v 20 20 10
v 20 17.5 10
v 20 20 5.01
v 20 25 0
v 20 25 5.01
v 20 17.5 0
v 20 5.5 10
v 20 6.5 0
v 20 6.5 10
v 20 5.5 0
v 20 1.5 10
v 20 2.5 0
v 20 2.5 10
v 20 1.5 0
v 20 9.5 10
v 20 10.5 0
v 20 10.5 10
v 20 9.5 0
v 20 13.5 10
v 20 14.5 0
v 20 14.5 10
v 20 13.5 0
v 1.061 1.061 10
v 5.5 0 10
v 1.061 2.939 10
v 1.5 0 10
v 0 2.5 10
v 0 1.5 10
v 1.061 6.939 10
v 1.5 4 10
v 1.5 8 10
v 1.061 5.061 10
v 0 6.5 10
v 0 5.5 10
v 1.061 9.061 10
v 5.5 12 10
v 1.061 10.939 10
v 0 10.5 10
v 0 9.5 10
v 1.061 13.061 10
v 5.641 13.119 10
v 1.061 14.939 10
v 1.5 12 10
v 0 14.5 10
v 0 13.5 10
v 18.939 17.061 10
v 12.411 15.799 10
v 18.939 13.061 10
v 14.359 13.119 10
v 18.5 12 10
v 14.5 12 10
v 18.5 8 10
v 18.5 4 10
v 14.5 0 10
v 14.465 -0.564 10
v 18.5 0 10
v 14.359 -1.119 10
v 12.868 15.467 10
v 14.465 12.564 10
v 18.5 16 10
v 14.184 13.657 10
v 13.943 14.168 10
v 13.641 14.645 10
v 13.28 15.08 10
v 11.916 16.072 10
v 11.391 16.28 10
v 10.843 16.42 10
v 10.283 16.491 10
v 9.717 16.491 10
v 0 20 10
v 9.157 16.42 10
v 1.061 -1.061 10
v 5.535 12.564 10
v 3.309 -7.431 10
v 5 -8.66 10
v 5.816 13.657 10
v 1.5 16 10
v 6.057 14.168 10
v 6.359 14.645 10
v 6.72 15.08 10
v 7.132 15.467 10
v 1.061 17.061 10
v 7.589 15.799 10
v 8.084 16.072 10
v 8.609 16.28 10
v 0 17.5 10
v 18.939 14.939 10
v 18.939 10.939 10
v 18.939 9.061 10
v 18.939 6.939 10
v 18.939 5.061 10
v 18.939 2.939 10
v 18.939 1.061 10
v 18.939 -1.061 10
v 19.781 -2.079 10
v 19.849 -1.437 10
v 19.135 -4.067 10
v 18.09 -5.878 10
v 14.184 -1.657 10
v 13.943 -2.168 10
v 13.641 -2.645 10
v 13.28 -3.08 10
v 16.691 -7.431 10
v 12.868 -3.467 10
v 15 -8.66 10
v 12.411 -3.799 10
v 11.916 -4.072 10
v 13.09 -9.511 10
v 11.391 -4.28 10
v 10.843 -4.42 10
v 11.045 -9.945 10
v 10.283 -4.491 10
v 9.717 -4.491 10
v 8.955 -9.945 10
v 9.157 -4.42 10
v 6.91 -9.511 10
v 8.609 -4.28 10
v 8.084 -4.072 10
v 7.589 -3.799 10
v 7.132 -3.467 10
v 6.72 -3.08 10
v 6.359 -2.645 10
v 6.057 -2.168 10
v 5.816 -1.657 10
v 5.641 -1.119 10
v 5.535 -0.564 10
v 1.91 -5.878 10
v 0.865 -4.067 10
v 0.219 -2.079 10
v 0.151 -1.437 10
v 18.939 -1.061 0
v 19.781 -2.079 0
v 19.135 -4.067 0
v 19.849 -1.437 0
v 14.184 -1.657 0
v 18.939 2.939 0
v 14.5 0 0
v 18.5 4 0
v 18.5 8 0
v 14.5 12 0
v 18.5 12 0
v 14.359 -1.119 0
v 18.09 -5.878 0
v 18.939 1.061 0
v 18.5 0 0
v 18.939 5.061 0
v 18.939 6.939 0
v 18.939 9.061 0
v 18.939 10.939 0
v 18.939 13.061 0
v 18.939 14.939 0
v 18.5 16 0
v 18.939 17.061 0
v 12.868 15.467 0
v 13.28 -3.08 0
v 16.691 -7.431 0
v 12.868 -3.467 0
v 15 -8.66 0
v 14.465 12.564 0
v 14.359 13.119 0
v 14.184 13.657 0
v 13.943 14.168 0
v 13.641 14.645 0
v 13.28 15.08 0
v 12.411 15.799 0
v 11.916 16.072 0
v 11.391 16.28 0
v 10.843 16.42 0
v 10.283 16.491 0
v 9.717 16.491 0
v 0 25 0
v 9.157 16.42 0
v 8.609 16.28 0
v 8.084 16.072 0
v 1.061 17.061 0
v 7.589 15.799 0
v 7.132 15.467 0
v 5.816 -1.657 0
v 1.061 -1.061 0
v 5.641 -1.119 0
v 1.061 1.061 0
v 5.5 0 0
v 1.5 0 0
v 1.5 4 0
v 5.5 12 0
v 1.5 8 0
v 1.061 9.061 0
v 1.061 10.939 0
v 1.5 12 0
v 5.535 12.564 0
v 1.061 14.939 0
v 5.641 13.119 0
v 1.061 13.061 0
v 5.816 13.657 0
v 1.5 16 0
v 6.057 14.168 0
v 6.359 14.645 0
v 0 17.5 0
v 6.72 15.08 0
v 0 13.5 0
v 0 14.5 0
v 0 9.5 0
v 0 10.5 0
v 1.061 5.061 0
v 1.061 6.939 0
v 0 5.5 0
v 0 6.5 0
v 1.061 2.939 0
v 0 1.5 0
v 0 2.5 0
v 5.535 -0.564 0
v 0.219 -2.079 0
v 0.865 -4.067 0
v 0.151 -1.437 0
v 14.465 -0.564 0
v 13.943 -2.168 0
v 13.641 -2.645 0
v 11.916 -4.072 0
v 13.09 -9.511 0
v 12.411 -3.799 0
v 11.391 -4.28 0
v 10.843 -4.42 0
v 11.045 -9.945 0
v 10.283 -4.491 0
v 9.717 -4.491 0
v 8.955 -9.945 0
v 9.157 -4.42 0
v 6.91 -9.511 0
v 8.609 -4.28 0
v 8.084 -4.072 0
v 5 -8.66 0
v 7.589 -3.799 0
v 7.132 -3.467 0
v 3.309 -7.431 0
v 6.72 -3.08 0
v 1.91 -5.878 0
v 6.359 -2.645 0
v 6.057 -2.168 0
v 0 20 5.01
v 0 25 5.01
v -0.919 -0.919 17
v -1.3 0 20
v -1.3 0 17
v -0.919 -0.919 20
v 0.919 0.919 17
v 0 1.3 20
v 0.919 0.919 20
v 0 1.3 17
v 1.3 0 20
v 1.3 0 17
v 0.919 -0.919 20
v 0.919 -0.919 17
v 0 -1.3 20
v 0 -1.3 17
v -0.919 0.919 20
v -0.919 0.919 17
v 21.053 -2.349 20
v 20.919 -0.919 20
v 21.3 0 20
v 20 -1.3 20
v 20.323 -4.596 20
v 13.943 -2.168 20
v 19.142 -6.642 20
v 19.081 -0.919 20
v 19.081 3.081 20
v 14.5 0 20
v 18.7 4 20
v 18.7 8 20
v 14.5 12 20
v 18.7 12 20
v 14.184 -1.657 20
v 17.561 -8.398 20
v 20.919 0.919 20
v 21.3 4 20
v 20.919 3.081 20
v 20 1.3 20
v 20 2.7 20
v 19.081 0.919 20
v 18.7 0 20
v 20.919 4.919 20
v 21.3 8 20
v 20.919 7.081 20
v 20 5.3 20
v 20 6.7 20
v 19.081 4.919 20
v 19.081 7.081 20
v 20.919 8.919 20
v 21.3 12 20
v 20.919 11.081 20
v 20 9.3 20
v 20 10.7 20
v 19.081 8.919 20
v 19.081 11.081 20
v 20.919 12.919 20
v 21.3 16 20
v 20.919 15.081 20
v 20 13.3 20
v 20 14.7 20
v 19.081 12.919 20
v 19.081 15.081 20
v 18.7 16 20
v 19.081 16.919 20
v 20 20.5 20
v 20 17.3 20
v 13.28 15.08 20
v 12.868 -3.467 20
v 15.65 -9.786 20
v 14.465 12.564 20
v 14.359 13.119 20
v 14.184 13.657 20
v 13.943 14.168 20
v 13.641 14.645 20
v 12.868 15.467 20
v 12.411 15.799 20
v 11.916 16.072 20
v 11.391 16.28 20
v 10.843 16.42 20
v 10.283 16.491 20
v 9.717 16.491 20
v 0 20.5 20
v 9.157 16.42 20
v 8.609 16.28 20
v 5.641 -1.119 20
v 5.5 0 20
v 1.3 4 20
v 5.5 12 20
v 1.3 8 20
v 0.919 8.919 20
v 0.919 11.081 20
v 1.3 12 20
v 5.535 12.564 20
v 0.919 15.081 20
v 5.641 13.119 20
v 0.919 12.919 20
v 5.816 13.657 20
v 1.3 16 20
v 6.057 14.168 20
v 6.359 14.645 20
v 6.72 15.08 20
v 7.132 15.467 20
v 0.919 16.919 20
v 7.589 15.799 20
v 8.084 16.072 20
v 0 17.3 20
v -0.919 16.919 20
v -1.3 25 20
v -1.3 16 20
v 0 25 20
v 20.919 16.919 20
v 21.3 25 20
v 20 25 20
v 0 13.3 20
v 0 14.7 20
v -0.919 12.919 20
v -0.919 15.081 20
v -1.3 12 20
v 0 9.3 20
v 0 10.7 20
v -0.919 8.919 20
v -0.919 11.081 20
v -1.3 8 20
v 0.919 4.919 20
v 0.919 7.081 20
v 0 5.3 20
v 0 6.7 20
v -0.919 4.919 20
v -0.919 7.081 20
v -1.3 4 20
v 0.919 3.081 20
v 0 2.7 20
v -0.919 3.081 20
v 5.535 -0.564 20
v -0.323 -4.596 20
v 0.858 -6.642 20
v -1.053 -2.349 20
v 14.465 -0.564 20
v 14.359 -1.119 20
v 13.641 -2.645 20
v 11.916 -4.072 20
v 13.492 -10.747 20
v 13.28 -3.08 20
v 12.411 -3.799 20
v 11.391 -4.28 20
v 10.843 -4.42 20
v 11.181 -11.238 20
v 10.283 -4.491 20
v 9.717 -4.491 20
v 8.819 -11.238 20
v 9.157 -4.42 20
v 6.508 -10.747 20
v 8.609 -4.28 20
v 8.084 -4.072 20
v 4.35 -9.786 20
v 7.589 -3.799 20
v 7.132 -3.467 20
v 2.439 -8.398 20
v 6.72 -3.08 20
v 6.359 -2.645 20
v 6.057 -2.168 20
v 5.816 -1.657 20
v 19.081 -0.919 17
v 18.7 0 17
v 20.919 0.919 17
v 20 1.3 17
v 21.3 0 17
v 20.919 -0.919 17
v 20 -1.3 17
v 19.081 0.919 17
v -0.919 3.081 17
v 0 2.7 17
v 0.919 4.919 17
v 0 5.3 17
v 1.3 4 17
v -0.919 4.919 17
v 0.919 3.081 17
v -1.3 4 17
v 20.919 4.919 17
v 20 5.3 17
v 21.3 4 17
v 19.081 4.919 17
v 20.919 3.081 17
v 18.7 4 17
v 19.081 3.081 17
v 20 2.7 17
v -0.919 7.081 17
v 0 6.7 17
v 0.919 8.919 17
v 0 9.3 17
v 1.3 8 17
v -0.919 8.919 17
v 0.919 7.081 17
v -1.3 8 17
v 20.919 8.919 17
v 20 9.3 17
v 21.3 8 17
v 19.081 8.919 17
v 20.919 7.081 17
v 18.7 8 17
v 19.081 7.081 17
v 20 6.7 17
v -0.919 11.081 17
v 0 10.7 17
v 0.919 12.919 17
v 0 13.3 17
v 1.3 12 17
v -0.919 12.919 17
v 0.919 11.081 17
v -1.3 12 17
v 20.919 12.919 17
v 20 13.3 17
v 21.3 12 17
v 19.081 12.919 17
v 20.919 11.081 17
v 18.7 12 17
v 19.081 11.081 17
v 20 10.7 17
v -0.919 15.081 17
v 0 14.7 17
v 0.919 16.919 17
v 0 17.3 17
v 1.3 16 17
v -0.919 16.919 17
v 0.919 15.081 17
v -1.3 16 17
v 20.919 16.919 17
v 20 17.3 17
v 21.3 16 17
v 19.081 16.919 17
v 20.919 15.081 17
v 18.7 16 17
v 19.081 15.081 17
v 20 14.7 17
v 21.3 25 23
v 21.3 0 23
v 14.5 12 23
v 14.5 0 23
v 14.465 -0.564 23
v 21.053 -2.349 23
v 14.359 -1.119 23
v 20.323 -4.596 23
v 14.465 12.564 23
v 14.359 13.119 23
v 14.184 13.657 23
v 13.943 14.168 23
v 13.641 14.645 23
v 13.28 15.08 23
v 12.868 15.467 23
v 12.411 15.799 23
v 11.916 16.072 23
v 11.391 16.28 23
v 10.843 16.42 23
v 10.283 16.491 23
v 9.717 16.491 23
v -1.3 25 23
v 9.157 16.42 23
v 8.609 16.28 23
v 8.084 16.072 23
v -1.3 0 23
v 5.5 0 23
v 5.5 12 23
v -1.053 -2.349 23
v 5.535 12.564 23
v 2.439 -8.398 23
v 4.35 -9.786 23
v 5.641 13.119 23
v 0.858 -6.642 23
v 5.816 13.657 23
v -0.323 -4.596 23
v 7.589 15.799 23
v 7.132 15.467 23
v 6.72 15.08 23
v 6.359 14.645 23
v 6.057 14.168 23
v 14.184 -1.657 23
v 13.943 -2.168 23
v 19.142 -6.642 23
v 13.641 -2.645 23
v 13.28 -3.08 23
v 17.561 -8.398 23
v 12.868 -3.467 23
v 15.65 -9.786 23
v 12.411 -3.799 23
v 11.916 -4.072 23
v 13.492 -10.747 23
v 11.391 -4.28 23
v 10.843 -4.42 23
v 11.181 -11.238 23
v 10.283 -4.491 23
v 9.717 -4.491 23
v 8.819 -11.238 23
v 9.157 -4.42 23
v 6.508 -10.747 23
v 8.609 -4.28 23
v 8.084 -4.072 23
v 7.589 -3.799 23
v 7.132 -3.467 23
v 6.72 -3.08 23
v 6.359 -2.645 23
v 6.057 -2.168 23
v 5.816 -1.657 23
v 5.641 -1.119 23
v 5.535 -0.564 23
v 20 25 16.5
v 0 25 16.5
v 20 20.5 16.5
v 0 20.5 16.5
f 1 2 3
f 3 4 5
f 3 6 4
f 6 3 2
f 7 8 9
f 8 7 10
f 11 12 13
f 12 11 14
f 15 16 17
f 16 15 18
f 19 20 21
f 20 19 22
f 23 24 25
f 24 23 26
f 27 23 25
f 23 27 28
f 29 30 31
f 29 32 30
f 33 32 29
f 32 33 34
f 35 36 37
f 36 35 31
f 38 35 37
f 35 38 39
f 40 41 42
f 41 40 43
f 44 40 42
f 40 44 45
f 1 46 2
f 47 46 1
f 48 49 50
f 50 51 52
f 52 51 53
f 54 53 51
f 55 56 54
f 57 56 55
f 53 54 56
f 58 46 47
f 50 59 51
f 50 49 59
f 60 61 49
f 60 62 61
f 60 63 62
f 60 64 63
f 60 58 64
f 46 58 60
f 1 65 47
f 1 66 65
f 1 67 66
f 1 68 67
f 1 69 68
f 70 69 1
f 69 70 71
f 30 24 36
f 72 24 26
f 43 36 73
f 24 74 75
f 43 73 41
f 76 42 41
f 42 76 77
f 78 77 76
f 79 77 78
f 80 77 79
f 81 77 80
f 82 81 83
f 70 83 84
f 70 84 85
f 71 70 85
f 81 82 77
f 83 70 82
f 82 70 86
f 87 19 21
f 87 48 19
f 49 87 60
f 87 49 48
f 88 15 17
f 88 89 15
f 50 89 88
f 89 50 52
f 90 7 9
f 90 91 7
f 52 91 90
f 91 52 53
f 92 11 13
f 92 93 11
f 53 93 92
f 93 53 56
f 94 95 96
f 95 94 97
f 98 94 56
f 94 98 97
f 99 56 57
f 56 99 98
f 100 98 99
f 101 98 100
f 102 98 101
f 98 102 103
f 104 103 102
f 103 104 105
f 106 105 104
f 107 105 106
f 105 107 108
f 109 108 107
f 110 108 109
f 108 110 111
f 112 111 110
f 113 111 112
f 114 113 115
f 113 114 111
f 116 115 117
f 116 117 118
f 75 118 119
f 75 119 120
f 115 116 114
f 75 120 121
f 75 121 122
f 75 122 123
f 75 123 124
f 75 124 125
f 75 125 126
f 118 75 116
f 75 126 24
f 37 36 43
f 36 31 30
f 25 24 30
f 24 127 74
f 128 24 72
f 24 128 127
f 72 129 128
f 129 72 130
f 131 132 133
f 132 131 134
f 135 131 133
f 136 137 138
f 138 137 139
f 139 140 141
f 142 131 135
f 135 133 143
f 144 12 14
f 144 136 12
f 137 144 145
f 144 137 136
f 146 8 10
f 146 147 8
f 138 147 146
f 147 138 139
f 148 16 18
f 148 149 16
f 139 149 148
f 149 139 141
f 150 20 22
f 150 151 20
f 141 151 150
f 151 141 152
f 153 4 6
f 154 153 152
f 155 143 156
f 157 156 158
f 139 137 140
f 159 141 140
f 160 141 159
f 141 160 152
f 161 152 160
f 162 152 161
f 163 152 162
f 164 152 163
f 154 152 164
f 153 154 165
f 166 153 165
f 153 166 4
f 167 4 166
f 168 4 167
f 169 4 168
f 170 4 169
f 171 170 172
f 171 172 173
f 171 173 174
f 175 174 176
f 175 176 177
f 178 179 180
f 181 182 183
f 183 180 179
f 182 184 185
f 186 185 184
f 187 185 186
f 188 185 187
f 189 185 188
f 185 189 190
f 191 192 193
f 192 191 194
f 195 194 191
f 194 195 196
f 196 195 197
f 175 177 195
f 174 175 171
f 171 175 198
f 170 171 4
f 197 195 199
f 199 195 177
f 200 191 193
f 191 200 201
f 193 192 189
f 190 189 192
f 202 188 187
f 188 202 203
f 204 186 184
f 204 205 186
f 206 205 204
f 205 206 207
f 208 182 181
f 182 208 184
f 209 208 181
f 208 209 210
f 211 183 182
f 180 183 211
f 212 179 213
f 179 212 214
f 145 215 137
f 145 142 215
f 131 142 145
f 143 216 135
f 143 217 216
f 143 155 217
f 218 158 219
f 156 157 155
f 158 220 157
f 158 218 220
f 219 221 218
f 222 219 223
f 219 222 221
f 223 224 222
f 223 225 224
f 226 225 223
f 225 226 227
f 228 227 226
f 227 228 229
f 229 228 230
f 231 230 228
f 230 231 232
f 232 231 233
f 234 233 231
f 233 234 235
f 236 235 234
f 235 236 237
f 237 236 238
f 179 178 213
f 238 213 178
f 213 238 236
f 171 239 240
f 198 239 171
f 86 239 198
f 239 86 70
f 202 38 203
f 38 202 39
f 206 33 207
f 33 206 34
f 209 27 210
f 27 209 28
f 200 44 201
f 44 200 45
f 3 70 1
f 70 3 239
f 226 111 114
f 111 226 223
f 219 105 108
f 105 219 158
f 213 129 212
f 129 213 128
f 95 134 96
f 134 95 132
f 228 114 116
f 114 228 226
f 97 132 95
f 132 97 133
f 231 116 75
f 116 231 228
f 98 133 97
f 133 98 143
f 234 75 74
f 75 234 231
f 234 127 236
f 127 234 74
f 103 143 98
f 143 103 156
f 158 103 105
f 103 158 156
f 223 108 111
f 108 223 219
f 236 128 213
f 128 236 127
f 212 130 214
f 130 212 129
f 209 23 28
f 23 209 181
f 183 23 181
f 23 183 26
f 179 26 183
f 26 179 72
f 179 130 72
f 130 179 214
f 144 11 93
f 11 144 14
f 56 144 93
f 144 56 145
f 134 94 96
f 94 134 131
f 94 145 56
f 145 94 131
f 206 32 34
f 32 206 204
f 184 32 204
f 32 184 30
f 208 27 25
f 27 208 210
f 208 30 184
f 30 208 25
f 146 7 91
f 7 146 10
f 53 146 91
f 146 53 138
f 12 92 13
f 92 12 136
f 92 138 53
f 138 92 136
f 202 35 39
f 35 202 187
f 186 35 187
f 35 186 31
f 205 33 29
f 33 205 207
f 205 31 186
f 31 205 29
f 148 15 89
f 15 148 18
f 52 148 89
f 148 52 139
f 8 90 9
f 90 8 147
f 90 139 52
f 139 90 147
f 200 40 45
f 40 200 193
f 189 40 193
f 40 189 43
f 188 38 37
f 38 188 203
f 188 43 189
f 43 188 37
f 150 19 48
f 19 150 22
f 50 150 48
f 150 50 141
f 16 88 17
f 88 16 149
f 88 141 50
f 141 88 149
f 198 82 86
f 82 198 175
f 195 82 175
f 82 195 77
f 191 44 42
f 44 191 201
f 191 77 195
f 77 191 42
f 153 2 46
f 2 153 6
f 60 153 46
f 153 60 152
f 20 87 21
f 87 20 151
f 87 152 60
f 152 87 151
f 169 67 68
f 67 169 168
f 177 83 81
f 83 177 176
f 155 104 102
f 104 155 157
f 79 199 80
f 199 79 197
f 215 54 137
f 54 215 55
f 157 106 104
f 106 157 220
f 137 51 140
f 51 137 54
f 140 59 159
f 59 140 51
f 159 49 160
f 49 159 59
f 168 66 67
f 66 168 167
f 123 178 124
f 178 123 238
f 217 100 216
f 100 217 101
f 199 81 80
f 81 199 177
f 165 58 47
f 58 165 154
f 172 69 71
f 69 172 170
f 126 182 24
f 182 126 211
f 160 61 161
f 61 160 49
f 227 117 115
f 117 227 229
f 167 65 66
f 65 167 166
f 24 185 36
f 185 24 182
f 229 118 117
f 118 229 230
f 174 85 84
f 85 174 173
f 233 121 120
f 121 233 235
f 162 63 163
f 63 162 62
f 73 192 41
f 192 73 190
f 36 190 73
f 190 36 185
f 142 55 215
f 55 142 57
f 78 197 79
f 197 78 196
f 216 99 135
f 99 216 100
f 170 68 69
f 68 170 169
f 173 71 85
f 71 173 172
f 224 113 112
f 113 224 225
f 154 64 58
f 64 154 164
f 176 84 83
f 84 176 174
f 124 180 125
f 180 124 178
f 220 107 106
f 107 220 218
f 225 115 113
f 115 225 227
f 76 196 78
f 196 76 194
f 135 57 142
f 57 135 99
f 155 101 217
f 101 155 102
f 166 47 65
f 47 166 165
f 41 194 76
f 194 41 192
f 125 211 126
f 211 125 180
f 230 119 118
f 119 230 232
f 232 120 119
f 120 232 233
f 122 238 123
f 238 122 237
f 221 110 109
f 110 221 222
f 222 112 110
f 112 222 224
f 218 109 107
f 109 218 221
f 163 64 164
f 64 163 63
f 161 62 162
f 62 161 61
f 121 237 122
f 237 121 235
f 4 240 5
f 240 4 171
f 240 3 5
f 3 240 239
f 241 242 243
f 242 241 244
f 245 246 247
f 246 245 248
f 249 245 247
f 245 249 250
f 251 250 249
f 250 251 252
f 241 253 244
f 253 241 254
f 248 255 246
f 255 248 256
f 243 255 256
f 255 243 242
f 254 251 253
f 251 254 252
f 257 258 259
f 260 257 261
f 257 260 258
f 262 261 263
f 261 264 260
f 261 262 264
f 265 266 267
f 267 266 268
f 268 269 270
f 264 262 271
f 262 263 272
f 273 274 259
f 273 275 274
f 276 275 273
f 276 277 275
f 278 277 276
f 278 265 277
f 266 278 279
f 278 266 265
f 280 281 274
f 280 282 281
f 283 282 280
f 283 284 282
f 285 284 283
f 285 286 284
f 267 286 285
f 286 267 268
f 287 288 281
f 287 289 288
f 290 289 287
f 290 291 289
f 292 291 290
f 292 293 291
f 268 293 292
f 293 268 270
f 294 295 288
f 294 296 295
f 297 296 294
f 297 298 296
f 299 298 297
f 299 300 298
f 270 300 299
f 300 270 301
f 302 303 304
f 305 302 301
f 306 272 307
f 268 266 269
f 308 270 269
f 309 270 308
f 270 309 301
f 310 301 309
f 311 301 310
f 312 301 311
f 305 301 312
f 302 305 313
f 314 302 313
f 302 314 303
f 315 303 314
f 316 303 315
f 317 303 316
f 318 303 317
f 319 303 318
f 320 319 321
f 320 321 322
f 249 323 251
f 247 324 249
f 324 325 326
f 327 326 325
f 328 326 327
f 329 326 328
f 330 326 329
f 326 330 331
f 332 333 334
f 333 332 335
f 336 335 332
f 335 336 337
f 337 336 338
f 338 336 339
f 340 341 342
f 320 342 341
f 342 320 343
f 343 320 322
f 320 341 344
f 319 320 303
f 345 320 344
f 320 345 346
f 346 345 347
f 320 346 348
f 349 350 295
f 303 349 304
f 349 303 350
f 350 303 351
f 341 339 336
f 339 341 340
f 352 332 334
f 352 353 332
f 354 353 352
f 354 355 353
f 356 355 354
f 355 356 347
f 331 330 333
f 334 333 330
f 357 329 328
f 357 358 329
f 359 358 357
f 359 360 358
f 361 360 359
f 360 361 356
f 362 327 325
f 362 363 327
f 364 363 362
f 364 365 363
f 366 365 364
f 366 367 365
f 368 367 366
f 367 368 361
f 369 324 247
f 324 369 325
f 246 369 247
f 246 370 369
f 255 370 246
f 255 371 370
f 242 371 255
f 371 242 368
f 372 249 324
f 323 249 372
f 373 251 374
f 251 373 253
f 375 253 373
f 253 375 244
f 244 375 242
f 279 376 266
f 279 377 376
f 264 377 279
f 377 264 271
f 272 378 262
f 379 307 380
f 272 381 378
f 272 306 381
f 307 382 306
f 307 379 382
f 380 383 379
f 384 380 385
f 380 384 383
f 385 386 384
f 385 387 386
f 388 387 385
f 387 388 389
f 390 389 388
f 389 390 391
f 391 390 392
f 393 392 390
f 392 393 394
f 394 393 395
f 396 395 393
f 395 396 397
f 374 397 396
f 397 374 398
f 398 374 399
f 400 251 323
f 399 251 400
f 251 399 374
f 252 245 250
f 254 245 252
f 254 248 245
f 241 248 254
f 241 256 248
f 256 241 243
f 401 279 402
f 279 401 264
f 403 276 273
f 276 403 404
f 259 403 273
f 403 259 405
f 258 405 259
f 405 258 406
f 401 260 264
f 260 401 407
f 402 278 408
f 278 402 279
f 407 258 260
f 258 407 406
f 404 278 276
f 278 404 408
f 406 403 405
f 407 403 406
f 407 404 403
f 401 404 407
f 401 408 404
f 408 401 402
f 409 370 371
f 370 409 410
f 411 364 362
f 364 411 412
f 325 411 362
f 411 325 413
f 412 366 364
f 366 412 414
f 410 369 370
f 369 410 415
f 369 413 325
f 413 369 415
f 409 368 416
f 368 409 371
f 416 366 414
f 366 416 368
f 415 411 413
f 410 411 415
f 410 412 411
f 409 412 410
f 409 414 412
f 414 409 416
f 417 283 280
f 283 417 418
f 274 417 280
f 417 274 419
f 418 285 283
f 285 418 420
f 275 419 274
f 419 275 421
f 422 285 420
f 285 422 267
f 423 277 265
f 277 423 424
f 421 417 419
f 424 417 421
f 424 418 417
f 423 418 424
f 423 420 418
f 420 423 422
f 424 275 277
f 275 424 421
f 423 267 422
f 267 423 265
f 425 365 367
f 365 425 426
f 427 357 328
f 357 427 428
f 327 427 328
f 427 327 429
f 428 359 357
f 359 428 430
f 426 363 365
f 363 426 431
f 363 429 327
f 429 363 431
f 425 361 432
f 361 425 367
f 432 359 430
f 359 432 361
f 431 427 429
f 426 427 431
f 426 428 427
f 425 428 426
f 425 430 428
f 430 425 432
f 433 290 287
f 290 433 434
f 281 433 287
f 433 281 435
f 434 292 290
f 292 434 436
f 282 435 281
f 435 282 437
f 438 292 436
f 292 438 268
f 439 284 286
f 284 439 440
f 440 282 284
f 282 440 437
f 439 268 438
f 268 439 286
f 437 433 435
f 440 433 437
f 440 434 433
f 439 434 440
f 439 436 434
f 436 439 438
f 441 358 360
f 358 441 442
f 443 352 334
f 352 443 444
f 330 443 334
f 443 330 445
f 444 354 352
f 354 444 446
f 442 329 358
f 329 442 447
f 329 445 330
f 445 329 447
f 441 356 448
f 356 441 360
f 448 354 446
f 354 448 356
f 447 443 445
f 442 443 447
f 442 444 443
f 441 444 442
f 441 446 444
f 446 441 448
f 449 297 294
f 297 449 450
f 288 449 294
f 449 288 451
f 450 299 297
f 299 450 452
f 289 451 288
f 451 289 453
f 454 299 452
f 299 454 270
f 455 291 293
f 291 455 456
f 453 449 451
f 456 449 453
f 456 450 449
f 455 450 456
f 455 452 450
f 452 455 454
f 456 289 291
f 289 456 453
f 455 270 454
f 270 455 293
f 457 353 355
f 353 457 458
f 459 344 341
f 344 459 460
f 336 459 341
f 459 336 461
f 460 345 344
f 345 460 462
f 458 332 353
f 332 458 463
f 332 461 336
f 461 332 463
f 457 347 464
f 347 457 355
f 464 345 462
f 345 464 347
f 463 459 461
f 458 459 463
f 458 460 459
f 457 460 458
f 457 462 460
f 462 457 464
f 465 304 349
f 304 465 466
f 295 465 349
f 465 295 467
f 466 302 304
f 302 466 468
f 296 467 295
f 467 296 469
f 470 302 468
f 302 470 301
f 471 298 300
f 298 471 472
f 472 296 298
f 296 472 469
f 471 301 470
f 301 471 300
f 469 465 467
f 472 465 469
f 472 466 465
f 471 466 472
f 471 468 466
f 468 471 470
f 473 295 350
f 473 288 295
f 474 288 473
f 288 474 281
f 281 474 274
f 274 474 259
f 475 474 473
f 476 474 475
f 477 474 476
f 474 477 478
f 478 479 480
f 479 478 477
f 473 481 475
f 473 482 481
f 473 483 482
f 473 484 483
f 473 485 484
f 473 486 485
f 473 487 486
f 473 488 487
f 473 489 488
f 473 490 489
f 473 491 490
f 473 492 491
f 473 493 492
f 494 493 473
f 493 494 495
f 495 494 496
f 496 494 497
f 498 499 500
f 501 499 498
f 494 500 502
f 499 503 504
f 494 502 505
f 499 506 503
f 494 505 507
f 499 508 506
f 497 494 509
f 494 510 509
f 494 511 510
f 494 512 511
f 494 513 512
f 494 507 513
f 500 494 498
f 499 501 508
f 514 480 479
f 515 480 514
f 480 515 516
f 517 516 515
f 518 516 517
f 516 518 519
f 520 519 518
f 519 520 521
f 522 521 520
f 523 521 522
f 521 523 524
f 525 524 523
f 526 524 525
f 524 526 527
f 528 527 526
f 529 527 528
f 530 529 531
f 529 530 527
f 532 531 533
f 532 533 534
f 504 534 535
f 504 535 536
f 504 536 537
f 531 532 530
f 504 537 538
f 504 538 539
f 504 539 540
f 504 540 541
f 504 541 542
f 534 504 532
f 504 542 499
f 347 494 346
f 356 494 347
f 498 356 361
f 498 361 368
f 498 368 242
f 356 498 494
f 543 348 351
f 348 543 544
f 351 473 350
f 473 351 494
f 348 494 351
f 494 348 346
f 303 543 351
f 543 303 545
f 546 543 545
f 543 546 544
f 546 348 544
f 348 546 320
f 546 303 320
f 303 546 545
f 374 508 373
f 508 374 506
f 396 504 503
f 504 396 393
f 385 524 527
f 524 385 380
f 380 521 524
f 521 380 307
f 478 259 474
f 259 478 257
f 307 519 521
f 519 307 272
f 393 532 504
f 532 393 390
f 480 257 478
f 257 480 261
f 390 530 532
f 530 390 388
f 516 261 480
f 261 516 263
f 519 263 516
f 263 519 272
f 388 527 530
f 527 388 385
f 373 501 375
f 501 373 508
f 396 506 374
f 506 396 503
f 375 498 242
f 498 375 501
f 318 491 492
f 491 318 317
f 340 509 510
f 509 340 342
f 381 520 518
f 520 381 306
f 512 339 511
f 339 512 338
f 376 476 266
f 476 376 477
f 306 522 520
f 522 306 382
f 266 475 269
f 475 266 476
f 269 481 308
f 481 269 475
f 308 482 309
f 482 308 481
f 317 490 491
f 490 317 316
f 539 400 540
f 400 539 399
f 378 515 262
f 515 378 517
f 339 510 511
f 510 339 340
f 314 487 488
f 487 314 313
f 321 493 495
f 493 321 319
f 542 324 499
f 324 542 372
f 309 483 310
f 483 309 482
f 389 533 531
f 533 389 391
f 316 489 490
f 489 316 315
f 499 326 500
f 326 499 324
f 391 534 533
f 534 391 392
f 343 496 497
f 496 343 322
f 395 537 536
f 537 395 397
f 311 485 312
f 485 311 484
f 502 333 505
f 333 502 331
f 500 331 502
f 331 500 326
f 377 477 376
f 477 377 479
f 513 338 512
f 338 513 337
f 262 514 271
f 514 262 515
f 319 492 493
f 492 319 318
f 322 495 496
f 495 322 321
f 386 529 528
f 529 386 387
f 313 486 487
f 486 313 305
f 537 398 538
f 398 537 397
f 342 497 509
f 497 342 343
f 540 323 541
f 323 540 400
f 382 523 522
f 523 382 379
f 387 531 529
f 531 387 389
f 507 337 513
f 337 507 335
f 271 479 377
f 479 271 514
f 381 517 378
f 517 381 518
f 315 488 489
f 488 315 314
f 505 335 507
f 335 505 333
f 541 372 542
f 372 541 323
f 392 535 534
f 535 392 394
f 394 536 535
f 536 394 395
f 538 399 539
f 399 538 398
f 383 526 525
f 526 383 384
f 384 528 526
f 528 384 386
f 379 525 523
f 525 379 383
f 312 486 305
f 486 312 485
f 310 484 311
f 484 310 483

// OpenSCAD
width=20;
length=20;
height=10;

module base(){
    difference(){
        union(){
            cube([width,length,height]);
            translate([10,0,0])
            cylinder(r=10,h=height,$fn=30);
        }
        hull(){
            translate([width/2,0,-5])
            cylinder(r=4.5, h=20, $fn=50);
            
            translate([width/2,length-8,-5])
            cylinder(r=4.5, h=20, $fn=50);    
        }
        
        /*
        translate([width/2,length-8,-0.01])
        #cylinder(r=15/2, h=7, $fn=6);        
        */
        
        for(offset = [0 : 4 : length-4]){
            translate([0,offset,-5])
            cylinder(r=1.5, h=20, $fn=8);
            
            translate([width,offset,-5])
            cylinder(r=1.5, h=20, $fn=8);        
        }
    }

    difference(){
        translate([0, length, 0])
        cube([width, 5, height]);
        
        /*
        translate([-0.5,length,0])
        rotate([-20,0,0])
        cube([width+1, 10, 20]);
        */
        translate([-0.5, length, 5.01])    
        cube([width+1, 10,5]);
    }
    translate([0, length, 0])
    cube([width, 5, 4]);
}

//////////////////////////////// deckel
module deckel(){
    translate([0,0,height+10]){
        difference(){
            union(){
                translate([-1.3,0,0])
                cube([width+2*1.3,length+5,3]);
                translate([0,length+0.5,-5+1.5])
                cube([width,5-0.5,5-1.5]);
                
                translate([10,0,0])
                cylinder(r=11.3,h=3,$fn=30);            

                for(offset = [0 : 4 : length-4]){
                    translate([0,offset,-3])
                    cylinder(r=1.3, h=3, $fn=8);
                    
                    translate([width,offset,-3])
                    cylinder(r=1.3, h=3, $fn=8);        
                }            
                
            }
           hull(){
                translate([width/2,0,-5])
                cylinder(r=4.5, h=20, $fn=50);
                
                translate([width/2,length-8,-5])
                cylinder(r=4.5, h=20, $fn=50);    
            }        
        }
    }
}

base();
deckel();
